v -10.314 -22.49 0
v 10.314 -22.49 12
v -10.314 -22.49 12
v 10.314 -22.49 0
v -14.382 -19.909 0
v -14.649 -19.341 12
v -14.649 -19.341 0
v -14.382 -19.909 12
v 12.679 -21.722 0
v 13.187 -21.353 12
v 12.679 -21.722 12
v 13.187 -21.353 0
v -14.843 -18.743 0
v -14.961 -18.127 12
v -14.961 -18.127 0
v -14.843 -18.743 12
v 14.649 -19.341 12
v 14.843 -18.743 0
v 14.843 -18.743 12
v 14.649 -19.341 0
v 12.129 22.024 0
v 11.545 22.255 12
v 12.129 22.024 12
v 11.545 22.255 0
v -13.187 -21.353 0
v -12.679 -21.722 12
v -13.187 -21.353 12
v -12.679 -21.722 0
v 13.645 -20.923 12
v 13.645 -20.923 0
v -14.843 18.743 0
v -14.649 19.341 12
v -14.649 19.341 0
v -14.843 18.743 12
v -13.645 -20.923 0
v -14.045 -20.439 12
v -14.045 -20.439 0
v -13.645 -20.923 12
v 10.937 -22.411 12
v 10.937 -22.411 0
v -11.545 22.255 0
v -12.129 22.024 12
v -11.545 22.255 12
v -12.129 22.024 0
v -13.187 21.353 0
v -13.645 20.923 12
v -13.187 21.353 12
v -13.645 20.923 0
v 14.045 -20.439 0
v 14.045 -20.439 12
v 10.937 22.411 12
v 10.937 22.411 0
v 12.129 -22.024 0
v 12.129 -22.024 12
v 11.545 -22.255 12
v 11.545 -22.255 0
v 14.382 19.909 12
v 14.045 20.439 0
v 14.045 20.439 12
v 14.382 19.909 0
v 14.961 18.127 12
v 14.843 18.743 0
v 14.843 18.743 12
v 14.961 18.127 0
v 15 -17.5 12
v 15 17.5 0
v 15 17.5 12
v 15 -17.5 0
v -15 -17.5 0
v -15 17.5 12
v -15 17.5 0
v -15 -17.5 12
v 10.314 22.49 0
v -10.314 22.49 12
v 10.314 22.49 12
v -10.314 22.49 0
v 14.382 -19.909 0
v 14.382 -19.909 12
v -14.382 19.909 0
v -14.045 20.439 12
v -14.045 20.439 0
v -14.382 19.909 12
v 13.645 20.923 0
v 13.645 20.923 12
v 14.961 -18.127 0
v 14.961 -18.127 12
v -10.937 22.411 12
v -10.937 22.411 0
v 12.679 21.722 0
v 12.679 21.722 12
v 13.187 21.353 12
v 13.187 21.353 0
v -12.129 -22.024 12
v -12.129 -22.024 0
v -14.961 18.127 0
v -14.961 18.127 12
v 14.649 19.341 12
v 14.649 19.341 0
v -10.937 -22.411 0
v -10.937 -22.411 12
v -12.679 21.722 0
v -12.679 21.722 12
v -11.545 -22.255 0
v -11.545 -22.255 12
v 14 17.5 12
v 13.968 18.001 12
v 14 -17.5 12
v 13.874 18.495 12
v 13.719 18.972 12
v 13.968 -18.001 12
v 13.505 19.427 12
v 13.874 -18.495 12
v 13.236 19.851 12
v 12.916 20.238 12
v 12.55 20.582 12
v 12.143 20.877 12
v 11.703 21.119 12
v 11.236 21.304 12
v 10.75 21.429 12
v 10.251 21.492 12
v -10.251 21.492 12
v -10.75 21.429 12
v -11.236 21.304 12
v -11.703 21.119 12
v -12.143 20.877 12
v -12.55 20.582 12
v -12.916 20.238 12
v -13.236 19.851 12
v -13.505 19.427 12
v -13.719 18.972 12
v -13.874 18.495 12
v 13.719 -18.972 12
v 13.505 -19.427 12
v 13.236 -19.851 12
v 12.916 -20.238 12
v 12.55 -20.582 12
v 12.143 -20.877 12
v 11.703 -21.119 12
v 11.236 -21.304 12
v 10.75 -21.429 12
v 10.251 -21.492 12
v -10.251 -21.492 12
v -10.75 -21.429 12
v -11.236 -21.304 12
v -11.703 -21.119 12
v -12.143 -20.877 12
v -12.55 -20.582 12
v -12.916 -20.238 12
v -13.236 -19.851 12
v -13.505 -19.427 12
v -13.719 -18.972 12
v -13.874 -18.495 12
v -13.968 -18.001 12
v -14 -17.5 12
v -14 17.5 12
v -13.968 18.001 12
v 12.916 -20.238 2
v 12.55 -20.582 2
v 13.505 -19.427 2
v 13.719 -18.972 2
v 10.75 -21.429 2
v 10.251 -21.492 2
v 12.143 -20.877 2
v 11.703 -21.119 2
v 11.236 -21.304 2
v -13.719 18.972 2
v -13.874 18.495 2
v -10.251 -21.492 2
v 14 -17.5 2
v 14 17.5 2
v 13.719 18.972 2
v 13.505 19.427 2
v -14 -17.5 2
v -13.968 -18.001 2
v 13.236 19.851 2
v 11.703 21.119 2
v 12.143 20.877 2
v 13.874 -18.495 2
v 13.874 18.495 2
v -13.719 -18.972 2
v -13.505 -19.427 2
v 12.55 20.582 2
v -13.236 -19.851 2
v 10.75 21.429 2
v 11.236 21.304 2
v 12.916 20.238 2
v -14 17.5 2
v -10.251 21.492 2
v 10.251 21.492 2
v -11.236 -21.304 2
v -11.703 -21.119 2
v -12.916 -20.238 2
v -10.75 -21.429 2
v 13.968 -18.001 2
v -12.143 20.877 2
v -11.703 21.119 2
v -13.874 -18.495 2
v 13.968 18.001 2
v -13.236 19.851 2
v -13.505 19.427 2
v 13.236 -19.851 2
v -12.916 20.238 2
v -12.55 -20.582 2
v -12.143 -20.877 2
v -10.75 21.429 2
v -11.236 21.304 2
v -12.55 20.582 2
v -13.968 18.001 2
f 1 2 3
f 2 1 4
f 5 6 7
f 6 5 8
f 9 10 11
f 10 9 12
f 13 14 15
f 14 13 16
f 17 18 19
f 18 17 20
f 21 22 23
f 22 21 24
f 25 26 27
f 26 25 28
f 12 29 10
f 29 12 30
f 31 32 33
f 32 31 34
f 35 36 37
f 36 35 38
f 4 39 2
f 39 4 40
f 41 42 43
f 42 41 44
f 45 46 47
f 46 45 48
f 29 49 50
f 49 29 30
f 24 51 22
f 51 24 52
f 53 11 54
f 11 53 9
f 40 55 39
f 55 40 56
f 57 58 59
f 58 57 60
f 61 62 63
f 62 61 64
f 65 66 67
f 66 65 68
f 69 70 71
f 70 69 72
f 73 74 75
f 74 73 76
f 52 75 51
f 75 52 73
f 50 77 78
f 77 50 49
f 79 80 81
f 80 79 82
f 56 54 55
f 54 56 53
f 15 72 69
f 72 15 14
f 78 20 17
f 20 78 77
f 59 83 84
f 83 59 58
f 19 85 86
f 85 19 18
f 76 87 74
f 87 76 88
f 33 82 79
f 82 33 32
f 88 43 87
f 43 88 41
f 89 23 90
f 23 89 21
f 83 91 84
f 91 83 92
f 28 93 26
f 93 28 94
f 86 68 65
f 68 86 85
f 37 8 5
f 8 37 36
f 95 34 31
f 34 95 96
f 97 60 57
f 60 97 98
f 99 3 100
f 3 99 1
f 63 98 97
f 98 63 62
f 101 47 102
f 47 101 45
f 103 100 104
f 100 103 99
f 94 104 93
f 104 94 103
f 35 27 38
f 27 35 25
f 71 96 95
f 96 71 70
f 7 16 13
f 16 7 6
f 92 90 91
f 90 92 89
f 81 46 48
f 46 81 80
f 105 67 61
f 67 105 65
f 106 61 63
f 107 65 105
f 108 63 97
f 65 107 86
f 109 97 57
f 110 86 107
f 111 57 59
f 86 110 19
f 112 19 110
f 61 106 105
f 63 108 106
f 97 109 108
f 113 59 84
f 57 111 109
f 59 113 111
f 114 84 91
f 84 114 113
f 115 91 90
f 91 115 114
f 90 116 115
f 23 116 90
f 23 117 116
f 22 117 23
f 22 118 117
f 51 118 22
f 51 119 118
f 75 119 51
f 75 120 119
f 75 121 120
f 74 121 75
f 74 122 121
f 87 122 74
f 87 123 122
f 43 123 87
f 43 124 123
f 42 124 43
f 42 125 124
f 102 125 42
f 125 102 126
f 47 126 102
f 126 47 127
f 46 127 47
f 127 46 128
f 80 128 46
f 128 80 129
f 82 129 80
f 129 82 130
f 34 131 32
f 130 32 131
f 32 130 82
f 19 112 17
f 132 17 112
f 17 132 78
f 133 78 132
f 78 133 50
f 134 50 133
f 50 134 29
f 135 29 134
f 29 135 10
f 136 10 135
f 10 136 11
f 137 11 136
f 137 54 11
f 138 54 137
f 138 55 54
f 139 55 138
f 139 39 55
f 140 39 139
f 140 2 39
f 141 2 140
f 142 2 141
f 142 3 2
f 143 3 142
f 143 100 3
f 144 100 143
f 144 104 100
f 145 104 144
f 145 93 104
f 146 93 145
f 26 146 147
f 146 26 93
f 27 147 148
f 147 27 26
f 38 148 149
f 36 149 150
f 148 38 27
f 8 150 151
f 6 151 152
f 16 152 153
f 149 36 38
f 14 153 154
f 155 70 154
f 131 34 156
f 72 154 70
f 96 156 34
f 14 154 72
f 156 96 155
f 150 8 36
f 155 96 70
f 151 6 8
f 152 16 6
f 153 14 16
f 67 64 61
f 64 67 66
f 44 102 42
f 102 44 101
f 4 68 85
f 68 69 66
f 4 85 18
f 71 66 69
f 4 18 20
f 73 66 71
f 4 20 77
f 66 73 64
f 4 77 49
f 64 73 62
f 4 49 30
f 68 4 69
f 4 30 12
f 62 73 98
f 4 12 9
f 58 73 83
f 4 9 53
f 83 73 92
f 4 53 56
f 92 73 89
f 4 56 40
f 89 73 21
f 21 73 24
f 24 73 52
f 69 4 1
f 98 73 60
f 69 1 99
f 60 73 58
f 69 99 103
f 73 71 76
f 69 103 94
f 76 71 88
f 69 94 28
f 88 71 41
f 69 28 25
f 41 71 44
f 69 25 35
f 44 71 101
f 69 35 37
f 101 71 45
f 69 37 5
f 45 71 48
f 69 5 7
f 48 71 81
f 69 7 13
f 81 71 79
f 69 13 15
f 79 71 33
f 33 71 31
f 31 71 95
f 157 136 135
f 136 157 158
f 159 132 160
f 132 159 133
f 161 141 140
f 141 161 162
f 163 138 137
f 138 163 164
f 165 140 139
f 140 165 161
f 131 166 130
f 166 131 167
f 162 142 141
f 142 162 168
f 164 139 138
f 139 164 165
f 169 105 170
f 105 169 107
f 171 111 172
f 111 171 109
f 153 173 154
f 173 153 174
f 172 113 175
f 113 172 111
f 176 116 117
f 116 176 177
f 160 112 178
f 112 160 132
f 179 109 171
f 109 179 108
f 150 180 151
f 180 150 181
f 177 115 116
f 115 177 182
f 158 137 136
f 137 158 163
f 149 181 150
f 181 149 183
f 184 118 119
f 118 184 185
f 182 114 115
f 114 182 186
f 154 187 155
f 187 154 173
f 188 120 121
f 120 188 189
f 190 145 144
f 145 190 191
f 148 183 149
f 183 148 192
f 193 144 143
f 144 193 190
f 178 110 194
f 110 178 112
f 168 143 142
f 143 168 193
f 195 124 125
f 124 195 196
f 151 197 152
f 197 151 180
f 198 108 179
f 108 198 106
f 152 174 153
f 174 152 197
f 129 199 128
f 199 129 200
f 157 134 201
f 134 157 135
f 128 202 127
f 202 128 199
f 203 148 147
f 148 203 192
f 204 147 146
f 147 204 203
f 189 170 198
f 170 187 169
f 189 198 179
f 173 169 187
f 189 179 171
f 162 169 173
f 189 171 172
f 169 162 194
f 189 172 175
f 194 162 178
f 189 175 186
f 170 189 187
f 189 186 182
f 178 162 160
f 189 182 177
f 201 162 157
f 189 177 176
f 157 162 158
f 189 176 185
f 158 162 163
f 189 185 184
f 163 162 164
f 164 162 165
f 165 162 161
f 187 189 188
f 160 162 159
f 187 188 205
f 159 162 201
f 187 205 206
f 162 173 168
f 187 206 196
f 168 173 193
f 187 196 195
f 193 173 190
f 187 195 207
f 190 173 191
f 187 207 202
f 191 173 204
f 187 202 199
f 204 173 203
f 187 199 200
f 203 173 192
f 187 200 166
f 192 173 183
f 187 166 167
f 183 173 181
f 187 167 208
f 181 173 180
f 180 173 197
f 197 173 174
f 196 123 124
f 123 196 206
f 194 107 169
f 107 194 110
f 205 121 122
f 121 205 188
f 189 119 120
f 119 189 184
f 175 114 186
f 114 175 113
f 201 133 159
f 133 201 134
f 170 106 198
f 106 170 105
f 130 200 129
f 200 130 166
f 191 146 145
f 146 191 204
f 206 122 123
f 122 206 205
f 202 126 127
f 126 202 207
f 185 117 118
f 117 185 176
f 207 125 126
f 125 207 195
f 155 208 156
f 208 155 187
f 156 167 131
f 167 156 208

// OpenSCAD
$fn = 50;


difference() {
	union() {
		hull() {
			translate(v = [-10.0000000000, 17.5000000000, 0]) {
				cylinder(h = 12, r = 5);
			}
			translate(v = [10.0000000000, 17.5000000000, 0]) {
				cylinder(h = 12, r = 5);
			}
			translate(v = [-10.0000000000, -17.5000000000, 0]) {
				cylinder(h = 12, r = 5);
			}
			translate(v = [10.0000000000, -17.5000000000, 0]) {
				cylinder(h = 12, r = 5);
			}
		}
	}
	union() {
		translate(v = [0, 0, 2]) {
			hull() {
				translate(v = [-10.0000000000, 17.5000000000, 0]) {
					cylinder(h = 10, r = 4);
				}
				translate(v = [10.0000000000, 17.5000000000, 0]) {
					cylinder(h = 10, r = 4);
				}
				translate(v = [-10.0000000000, -17.5000000000, 0]) {
					cylinder(h = 10, r = 4);
				}
				translate(v = [10.0000000000, -17.5000000000, 0]) {
					cylinder(h = 10, r = 4);
				}
			}
		}
	}
}
